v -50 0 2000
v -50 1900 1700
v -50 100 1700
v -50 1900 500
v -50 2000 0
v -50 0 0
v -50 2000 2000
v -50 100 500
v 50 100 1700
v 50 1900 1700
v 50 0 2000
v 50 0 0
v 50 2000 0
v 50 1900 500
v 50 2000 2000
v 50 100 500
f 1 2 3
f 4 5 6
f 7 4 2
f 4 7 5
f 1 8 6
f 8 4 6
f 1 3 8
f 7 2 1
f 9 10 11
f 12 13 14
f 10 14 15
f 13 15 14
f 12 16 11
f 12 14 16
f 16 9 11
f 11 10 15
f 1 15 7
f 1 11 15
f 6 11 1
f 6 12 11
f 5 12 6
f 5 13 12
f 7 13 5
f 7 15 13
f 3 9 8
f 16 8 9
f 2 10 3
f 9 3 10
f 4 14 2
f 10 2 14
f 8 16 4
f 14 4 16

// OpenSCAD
// file: modifiers/diagonalize.scad
include <../templates/basic-dims.scad>

module diagonalize_triangle_sketch(t = section_thickness) {
    x = sin(45) * t;
    y = cos(45) * t;

    polygon([
        [0, y],
        [x, 0],
        [0, -y]
    ]);
}

module diagonalize_triangle(t = section_thickness) {
    rotate([0, 0, 90])
    linear_extrude(section_height)
    diagonalize_triangle_sketch(t);
}

module diagonalize2D() {
    thickness = section_thickness / rt;

    trans = (section_thickness/2)*rt/2;
    len_scale = rt - section_thickness / (rt * section_width);

    rotate([0, 0, 45])
    translate([trans, 0, 0])
    scale([len_scale, 1/rt, 1])
    children();
}


module diagonalize3D(w = section_width, t = section_thickness, edges = "trans") {

    trans = (t/2)*rt/2;
    len_scale = rt - t / (rt * w);

    edge_angle = edges == "cis" ? 270 : 180;
    
    diagonalize_triangle(t/rt);

    translate([-w, w, 0])
    rotate([0, 0, edge_angle]) // 180 For continue, -90 (270) for end
    diagonalize_triangle(t/rt);

    rotate([0, 0, 45])
    translate([0, trans, 0])
    scale([1/rt, len_scale, 1])
    children();
}
// file: templates/t_shop-window.scad
include <./basic-dims.scad>
include <../modifiers/diagonalize.scad>

total_width = section_width * 2;

window_width = total_width * 0.9;
window_height = total_width * 0.6;
window_offset_bottom = section_height * 0.25;

bar_diam = section_thickness * 0.45;
window_padding = (total_width - window_width)/2;
bar_x_offset = window_padding;
num_bars = 8;
bar_gap = window_width/(num_bars + 1);

module wall_sketch() {

    difference() {
        square([total_width, section_height]);

        translate([total_width/2 - window_width/2, window_offset_bottom, 0])
        square([window_width, window_height]);
    }
}

module shop_window() {
    rotate([90, 0, 90])
    translate([0, 0, -section_thickness/2])
    linear_extrude(section_thickness)
    wall_sketch();
}

module window_bars() {
    rotate([90, 0, 90])
    for (i = [1 : num_bars]) {
        translate([0, 0, -section_thickness/2])
        translate([bar_x_offset + bar_gap* i, window_offset_bottom, section_thickness/2])
        rotate([-90, 0, 0])
        cylinder(d=bar_diam, h = window_height);
    }
}
// file: templates/basic-dims.scad
unit = 1000;

section_width = unit;
section_height = unit * 2;
section_thickness = unit * 0.1;

rt = sqrt(2);

//  -- Notes --
//  Z is UP
//  X is FORWARD (out of the screen)
// main file
include <./templates/basic-dims.scad>
include <./templates/t_shop-window.scad>

shop_window();  
